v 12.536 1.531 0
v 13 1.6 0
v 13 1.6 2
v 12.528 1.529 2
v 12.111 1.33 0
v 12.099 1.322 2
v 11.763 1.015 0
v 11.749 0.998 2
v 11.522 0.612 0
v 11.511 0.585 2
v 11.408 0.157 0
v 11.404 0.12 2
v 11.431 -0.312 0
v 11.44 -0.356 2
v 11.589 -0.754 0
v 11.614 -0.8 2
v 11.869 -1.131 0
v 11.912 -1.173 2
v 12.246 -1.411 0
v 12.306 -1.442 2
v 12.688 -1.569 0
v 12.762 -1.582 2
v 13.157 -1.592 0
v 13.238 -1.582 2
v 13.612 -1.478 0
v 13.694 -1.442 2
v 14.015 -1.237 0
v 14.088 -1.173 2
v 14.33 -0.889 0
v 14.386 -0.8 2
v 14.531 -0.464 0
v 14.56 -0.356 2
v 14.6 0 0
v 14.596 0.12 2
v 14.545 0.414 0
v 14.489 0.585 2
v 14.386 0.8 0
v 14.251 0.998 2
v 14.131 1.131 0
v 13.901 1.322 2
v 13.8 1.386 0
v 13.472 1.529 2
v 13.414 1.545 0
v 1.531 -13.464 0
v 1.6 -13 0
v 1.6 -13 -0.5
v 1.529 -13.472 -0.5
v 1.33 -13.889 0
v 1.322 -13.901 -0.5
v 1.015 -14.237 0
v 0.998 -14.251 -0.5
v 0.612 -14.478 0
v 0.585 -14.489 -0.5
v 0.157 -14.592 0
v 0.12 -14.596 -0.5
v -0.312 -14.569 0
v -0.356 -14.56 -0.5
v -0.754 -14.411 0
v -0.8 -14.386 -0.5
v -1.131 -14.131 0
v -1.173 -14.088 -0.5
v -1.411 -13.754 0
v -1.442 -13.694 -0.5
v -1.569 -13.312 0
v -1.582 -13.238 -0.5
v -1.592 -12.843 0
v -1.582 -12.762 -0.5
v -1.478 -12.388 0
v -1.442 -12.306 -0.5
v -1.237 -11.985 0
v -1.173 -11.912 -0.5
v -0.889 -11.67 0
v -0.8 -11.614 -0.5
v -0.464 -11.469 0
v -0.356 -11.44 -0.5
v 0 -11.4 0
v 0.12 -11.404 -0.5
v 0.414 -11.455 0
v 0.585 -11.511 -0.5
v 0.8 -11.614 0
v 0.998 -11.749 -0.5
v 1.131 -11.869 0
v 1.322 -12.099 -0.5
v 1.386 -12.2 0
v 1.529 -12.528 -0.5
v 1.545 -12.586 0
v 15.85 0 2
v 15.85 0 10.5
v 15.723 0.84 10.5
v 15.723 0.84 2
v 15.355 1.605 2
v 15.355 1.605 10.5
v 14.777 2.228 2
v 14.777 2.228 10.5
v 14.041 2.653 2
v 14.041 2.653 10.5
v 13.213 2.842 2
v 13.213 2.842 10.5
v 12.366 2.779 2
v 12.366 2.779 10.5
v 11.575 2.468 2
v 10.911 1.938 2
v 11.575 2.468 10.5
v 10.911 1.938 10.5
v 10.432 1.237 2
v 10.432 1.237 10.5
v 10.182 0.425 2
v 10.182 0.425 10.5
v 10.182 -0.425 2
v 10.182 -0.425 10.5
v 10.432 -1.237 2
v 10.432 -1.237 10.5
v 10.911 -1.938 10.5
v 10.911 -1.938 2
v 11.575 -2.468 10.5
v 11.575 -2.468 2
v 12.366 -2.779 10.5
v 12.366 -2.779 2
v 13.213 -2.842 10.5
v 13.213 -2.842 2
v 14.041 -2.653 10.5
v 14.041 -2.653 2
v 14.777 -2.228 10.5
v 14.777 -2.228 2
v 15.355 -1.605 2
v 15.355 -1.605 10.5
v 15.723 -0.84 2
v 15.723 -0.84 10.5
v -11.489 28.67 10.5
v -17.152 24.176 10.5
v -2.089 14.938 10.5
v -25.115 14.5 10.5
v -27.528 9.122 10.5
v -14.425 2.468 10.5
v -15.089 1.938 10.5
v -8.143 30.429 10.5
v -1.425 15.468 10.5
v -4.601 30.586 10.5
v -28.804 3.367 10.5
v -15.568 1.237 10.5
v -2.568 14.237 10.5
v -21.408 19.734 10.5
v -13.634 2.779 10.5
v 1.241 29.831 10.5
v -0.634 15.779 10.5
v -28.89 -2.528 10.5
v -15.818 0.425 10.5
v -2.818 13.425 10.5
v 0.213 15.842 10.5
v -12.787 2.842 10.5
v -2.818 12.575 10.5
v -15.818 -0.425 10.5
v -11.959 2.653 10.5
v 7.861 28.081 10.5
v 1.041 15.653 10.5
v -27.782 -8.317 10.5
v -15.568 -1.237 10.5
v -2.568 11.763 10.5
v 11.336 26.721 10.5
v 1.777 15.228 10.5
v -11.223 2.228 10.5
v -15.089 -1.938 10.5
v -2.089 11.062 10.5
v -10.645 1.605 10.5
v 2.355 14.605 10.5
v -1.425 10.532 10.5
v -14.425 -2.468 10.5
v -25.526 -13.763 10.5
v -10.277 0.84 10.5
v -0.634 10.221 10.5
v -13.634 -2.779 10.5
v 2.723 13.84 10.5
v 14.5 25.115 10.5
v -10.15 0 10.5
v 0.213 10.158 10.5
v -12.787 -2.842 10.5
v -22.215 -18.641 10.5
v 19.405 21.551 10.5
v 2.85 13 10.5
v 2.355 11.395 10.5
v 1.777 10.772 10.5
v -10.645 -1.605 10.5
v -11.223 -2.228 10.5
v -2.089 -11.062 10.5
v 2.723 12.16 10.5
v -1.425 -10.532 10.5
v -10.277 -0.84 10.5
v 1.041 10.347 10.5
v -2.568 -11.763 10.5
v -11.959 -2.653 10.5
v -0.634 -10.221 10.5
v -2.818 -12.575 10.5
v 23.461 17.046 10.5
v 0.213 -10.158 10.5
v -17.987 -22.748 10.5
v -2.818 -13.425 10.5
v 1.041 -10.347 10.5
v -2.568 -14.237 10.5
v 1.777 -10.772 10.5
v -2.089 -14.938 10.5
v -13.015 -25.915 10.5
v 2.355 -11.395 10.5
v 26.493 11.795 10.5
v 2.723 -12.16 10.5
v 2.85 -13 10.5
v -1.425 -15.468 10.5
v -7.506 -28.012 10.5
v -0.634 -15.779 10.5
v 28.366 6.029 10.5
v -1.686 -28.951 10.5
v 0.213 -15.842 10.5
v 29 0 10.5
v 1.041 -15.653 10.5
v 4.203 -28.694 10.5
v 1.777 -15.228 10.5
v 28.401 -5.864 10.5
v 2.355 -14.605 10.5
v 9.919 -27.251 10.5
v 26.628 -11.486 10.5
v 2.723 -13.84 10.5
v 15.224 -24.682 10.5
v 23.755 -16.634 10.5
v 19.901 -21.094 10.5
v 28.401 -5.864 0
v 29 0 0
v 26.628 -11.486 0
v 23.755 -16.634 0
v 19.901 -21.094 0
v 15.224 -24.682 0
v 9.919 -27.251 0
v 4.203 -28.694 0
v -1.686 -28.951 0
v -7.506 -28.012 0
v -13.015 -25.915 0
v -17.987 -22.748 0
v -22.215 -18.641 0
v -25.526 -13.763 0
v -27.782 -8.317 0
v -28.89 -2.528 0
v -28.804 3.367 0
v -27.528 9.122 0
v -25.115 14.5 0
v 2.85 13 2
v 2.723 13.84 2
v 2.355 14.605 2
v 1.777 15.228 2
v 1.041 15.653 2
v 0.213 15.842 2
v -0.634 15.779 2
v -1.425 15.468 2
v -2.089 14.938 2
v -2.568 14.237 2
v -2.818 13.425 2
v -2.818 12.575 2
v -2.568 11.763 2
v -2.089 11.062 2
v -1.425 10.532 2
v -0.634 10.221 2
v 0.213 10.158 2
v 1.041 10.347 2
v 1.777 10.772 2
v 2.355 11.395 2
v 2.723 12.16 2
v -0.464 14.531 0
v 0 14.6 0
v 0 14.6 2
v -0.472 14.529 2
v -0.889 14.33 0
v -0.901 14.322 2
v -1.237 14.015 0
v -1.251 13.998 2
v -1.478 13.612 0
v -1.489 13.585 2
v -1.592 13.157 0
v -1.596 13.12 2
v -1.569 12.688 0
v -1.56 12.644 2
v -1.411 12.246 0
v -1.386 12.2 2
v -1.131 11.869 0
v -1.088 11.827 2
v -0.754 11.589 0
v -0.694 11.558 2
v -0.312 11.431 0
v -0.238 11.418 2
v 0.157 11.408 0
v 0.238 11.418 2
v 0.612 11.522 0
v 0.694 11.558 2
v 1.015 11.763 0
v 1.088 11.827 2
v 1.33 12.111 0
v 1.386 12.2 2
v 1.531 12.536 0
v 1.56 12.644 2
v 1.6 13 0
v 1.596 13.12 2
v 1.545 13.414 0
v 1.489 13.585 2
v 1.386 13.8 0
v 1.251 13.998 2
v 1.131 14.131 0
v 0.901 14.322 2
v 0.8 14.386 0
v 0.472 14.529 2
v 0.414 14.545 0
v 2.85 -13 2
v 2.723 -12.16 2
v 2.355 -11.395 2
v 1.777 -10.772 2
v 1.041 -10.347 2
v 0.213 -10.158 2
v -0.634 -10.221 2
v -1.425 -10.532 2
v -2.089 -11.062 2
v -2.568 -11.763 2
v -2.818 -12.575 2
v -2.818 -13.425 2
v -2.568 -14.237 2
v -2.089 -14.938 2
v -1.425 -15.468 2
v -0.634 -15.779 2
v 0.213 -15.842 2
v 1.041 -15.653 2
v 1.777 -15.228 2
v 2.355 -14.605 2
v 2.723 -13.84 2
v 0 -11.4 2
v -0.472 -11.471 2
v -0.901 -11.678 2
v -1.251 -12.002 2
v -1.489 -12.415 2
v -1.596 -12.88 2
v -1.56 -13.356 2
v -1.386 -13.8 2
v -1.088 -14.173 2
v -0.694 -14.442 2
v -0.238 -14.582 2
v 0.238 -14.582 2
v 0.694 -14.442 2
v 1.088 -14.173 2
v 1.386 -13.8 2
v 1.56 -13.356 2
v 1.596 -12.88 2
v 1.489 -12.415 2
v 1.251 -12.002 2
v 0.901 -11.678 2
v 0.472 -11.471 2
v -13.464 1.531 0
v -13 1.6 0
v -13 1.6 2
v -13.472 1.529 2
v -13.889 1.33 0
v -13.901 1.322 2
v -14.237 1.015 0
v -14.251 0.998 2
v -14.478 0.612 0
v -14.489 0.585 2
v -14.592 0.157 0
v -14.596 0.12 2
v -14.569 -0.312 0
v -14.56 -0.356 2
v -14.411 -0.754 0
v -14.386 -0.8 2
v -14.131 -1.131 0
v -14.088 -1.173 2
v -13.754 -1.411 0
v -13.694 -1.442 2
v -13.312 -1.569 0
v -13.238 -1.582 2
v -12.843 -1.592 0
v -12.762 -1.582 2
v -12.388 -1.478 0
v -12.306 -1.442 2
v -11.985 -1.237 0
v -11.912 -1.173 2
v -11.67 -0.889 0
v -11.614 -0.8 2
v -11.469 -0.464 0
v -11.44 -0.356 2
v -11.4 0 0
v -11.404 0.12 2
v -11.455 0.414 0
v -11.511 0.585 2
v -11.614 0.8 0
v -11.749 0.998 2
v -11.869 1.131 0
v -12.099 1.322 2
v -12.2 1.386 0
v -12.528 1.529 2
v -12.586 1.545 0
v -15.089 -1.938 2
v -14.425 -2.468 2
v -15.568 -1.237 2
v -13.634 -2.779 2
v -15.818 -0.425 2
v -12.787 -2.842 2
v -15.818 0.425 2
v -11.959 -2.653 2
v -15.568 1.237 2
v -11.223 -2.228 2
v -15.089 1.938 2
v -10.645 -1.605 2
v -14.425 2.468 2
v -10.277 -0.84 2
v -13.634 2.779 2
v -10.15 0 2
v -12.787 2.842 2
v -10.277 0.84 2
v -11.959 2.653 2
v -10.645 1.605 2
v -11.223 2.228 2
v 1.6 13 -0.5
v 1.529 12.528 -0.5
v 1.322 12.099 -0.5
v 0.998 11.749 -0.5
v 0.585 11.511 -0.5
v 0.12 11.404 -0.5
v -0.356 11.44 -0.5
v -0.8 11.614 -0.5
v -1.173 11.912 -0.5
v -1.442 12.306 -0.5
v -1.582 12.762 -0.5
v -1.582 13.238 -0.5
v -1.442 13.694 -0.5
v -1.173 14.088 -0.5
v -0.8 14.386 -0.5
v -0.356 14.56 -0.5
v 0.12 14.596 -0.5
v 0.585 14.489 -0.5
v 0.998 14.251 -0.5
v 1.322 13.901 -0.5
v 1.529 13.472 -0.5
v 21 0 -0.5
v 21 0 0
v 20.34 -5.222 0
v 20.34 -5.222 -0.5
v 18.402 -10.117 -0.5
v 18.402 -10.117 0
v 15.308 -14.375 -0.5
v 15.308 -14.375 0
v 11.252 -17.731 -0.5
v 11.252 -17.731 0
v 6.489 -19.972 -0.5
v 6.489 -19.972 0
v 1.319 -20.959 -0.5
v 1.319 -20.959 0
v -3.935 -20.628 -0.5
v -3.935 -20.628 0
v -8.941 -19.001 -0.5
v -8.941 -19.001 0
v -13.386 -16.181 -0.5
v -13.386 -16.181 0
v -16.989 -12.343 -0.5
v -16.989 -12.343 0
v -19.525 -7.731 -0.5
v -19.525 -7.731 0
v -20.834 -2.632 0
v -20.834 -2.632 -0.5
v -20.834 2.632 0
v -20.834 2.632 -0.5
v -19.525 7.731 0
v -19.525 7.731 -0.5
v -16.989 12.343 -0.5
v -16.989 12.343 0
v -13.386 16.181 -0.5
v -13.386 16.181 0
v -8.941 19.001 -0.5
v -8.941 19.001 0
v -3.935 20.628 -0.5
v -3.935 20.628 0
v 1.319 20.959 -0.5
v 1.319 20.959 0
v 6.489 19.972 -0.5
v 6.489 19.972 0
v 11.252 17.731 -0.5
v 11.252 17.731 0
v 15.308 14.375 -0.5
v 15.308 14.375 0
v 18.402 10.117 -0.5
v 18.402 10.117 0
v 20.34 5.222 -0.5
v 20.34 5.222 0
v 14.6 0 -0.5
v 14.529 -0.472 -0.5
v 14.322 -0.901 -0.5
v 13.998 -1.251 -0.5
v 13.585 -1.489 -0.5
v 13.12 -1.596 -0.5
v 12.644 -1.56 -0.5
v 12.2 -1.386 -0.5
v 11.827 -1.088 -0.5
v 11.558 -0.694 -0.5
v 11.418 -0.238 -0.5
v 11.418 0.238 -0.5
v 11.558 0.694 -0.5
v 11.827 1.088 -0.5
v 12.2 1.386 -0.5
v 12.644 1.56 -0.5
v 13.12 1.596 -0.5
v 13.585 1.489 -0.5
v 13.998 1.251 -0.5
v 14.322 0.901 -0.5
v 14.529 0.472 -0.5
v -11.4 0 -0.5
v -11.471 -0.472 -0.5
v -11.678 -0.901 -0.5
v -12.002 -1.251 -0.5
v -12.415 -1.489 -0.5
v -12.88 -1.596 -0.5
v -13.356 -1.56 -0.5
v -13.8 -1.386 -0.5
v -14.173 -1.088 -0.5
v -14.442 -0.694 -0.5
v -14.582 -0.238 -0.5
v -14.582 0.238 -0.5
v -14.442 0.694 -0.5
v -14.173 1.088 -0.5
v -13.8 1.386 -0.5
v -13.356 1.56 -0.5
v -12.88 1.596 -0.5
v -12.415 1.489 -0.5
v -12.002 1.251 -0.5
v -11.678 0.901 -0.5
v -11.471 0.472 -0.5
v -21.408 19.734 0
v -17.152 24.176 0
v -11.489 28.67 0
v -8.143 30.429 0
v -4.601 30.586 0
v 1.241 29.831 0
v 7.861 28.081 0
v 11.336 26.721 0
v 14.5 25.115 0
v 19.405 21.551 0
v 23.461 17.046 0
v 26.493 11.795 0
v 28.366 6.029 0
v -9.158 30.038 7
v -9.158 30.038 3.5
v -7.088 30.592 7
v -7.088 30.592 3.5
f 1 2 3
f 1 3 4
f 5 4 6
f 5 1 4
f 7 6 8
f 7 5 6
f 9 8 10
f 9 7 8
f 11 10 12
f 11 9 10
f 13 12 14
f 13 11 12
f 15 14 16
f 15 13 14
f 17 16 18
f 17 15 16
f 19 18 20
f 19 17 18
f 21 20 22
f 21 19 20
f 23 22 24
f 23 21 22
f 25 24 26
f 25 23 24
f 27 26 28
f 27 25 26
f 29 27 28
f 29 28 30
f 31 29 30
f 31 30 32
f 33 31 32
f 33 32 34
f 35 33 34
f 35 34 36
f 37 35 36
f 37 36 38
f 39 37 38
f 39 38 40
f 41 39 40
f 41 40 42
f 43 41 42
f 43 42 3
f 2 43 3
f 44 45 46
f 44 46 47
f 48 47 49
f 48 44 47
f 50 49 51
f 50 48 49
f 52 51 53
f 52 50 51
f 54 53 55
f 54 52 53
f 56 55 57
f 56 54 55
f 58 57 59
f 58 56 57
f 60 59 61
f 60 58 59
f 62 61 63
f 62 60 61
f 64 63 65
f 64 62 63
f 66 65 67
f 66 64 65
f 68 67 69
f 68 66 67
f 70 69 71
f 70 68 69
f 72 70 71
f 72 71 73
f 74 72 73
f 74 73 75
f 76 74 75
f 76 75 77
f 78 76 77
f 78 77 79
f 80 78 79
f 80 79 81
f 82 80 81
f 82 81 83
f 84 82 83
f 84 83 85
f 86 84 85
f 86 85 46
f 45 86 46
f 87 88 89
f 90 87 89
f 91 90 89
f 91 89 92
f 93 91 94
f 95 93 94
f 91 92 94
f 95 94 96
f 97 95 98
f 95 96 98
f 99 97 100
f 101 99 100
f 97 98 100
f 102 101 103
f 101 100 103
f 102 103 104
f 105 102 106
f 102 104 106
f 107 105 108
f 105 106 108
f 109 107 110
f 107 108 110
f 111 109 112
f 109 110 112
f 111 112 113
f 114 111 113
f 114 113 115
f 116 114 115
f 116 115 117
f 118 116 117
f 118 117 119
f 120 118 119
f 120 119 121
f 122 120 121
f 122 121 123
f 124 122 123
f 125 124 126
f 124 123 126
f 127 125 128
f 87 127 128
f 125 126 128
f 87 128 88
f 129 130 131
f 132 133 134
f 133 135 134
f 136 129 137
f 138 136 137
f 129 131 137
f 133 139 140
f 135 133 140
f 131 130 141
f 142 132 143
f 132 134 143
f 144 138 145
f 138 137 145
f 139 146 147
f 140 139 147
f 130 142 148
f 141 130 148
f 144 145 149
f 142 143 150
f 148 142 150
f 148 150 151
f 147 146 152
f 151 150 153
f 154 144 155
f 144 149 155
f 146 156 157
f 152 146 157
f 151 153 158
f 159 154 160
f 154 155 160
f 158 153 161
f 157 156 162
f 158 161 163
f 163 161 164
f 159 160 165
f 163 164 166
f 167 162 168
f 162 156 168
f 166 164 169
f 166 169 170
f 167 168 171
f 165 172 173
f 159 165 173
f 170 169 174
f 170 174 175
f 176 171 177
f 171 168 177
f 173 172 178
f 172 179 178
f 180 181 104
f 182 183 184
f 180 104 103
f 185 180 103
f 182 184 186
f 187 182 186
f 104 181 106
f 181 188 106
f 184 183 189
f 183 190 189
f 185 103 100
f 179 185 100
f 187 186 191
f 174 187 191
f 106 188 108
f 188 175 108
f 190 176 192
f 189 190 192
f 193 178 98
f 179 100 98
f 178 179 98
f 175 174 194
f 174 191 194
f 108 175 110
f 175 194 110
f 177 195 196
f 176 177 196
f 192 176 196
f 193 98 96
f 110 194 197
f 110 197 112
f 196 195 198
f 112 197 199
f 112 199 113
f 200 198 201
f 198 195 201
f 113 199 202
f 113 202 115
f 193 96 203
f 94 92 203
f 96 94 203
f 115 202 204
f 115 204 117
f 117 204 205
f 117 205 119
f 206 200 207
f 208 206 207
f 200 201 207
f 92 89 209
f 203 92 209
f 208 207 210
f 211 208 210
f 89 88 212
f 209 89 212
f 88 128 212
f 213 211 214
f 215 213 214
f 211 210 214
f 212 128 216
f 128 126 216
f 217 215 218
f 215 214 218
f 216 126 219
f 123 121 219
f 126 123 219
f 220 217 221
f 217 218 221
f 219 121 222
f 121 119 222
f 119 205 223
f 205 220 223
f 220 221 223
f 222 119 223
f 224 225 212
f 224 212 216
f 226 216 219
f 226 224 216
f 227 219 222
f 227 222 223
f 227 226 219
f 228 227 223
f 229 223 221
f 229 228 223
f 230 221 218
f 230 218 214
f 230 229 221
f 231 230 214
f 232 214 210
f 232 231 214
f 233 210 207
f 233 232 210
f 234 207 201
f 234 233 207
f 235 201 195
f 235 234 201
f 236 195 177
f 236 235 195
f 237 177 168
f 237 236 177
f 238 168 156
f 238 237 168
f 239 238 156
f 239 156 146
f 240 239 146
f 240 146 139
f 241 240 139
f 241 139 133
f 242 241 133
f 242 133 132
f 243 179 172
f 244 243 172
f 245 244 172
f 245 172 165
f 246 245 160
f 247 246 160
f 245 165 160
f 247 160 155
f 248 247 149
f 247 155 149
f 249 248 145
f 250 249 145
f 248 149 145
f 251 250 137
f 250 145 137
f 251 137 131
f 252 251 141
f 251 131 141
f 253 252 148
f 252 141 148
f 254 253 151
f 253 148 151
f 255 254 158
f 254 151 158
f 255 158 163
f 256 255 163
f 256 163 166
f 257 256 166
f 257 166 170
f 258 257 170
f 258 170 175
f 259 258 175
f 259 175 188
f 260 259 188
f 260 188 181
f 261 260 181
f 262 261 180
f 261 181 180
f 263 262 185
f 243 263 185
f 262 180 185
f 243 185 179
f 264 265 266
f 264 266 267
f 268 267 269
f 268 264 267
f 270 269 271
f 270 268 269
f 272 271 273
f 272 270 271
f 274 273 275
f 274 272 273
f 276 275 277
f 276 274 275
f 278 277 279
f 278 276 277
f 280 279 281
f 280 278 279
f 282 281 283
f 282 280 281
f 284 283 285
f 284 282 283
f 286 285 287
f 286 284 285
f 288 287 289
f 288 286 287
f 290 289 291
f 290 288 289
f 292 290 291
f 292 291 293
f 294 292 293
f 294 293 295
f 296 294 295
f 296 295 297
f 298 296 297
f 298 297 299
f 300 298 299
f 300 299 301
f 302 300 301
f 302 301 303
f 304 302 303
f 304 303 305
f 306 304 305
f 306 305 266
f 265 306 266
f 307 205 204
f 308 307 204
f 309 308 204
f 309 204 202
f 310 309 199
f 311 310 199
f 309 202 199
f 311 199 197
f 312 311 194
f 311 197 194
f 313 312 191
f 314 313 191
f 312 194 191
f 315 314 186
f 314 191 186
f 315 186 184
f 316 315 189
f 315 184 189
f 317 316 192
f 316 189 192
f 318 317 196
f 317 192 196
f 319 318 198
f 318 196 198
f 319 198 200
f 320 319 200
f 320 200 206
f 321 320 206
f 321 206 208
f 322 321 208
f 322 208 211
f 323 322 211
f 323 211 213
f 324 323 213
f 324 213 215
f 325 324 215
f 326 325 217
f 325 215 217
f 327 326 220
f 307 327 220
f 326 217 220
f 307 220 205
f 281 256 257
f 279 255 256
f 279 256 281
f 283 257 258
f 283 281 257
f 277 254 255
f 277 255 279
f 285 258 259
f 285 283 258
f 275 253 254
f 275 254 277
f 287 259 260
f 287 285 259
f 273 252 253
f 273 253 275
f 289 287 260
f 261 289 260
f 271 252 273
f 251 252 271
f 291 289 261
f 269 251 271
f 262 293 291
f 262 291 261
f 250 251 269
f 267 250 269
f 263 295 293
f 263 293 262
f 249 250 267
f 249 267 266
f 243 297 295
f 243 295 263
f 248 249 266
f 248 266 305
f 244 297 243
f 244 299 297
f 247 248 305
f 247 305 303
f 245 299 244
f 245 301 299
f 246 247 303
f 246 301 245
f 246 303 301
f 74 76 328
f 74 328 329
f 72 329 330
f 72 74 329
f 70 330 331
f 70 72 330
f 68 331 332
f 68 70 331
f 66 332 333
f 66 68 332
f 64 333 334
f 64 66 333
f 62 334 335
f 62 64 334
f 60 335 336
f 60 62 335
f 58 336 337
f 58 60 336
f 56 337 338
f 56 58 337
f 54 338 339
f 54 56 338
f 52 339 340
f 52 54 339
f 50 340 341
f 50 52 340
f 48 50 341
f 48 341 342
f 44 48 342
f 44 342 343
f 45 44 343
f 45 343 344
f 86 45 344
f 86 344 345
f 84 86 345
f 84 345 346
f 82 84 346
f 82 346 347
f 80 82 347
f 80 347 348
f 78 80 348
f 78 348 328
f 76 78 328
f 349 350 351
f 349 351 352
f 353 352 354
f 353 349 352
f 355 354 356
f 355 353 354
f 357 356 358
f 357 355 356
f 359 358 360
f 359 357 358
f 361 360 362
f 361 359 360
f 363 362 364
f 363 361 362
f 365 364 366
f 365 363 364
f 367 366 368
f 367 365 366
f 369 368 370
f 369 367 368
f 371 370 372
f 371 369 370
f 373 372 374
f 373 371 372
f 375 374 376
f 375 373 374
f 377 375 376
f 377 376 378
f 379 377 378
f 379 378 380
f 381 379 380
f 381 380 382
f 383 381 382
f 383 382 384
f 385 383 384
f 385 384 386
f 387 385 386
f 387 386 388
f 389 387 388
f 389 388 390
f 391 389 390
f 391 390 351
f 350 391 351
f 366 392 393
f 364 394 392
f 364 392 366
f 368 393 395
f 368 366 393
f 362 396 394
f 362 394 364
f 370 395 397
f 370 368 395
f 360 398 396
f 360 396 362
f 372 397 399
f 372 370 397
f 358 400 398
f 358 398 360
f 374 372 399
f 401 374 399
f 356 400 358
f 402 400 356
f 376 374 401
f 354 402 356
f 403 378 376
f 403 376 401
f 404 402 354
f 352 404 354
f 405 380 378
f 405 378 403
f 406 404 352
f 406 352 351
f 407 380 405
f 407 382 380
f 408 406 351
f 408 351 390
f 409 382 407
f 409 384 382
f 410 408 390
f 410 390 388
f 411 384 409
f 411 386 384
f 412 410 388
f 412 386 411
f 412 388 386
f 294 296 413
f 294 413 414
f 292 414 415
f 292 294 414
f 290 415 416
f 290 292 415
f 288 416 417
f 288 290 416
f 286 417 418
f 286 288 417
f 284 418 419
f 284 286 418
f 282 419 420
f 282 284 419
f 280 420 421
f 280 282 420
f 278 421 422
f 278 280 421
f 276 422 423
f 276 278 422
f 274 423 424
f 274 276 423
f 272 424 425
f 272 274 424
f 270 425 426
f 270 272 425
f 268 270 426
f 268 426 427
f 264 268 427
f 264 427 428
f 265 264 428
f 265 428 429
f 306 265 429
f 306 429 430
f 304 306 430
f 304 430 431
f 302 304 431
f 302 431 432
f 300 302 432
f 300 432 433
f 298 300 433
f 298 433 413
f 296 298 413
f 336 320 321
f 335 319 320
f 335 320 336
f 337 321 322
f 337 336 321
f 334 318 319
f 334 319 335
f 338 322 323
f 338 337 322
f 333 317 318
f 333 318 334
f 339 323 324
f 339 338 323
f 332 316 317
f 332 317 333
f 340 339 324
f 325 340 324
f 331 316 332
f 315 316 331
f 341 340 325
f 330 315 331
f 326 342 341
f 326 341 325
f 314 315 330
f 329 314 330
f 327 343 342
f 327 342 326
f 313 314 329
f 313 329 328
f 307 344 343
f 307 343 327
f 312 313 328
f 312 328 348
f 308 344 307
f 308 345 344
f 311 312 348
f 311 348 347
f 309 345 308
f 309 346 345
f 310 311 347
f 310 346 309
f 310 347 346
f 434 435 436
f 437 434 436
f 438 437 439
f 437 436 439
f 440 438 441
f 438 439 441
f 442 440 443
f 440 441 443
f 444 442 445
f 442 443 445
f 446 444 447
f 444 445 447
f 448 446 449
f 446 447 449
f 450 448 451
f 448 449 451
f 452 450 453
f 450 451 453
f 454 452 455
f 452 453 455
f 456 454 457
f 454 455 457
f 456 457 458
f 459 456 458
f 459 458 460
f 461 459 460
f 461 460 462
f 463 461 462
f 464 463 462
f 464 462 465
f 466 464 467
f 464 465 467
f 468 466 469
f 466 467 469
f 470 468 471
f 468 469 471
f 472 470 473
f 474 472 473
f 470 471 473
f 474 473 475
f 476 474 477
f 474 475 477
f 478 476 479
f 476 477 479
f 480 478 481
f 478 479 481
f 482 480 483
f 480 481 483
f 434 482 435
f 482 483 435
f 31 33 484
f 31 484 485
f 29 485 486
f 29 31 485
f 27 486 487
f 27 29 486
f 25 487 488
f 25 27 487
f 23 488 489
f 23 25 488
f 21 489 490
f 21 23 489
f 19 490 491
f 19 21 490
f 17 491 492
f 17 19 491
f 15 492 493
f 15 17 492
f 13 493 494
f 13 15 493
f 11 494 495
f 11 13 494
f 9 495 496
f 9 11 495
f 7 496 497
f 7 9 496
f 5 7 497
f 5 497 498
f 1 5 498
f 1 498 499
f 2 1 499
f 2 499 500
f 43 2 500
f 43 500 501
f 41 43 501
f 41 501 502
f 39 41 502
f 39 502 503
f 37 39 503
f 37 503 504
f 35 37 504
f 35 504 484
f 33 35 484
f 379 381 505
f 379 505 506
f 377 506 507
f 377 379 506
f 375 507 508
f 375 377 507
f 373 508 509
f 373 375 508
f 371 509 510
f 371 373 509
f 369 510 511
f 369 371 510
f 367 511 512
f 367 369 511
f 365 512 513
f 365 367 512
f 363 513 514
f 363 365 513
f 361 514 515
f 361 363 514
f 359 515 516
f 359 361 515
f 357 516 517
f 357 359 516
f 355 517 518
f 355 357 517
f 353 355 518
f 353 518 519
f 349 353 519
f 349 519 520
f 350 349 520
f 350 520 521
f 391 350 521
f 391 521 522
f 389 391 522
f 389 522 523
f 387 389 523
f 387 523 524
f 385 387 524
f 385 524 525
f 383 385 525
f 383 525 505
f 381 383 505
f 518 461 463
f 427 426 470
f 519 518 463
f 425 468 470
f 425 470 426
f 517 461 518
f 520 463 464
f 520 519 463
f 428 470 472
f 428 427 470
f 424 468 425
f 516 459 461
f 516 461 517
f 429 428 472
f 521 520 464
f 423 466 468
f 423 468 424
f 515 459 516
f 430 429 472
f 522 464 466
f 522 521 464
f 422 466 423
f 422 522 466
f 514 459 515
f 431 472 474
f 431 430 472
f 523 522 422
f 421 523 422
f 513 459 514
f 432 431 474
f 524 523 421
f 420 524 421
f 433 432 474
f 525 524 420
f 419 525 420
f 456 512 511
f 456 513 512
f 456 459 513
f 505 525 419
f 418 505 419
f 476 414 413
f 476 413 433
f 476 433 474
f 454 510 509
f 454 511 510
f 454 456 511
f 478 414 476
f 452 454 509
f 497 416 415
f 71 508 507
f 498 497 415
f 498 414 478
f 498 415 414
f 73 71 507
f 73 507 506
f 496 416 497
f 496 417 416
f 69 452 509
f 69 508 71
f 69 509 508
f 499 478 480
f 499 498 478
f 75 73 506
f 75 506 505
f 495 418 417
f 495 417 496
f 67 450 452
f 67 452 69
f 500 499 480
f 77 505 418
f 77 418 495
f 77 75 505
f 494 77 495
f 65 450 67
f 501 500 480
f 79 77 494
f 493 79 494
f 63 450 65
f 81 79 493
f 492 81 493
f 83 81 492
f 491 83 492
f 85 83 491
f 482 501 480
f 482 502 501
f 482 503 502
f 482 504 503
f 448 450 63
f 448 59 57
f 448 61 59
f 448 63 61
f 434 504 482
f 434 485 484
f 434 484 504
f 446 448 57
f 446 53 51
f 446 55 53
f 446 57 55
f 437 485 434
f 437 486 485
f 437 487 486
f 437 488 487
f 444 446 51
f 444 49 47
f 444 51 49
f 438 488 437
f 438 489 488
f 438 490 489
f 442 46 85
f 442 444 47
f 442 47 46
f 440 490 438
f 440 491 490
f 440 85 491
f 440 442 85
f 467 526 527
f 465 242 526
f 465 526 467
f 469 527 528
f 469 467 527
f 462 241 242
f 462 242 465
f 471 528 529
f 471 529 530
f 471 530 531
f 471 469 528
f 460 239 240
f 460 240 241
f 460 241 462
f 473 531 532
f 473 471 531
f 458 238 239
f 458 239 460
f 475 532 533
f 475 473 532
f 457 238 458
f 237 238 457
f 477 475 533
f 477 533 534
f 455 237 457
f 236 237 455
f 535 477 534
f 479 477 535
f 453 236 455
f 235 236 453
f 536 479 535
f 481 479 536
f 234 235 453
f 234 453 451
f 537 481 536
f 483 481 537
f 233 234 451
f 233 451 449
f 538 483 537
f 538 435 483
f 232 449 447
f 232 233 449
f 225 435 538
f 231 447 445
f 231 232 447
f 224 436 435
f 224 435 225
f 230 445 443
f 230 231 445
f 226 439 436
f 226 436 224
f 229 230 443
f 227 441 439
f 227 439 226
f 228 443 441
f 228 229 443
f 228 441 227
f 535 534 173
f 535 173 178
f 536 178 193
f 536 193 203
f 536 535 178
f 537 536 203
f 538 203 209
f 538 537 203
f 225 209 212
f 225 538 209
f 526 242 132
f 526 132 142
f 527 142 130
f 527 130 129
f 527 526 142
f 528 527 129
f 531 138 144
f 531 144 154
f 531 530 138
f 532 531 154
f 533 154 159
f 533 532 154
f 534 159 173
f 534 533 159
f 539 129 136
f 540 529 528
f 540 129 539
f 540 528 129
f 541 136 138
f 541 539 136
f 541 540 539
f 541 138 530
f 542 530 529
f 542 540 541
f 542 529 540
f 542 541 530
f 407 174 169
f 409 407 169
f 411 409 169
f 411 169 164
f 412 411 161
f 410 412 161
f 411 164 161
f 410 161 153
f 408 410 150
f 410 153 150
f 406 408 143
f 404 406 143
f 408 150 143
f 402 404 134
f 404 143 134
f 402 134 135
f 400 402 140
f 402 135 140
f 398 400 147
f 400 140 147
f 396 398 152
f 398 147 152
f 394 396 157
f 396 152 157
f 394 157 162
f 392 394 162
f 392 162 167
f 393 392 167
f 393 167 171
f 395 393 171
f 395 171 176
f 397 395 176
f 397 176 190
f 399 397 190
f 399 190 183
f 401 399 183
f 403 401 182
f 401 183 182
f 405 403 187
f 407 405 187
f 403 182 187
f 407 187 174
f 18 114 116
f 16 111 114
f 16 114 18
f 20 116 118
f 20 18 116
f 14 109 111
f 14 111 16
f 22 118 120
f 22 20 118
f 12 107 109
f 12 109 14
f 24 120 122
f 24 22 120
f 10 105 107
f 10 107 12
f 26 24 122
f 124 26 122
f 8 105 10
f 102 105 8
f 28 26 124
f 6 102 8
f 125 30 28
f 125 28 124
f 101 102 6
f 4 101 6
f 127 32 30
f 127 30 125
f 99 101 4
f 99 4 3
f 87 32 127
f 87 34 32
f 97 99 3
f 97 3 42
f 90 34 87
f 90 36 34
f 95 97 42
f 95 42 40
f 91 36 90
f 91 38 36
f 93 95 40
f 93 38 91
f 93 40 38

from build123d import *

# Parameters (mm, degrees)
SKETCH1_R               = 21
SKETCH1_R_2             = 2.85
SKETCH1_R_3             = 1.6
BOSS_EXTRUDE1_DEPTH     = 10.5
SKETCH2_R               = 21
BOSS_EXTRUDE3_DEPTH     = 10.5
SKETCH3_R               = 21
SKETCH3_R_2             = 1.6
BOSS_EXTRUDE4_DEPTH     = 0.5
SKETCH4_R               = 2.85
SKETCH4_R_2             = 1.6
CUT_EXTRUDE1_DEPTH      = 1.0000001
CUT_EXTRUDE1_DEPTH_BACK = 8.5


with BuildPart() as part:
    # Sketch1 → Boss-Extrude1 (new body)
    with BuildSketch(Plane(origin=(0, 0, 0), x_dir=(0, 1, 0), z_dir=(0, 0, 1))):
        Circle(SKETCH1_R)
        with Locations((-13, 0)):
            Circle(SKETCH1_R_2, mode=Mode.SUBTRACT)
        with Locations((0, -13)):
            Circle(SKETCH1_R_2, mode=Mode.SUBTRACT)
        with Locations((13, 0)):
            Circle(SKETCH1_R_2, mode=Mode.SUBTRACT)
        with Locations((0, 13)):
            Circle(SKETCH1_R_2, mode=Mode.SUBTRACT)
        with Locations((-13, 0)):
            Circle(SKETCH1_R_2)
        with Locations((-13, 0)):
            Circle(SKETCH1_R_3, mode=Mode.SUBTRACT)
        with Locations((0, 13)):
            Circle(SKETCH1_R_2)
        with Locations((0, 13)):
            Circle(SKETCH1_R_3, mode=Mode.SUBTRACT)
        with Locations((13, 0)):
            Circle(SKETCH1_R_2)
        with Locations((13, 0)):
            Circle(SKETCH1_R_3, mode=Mode.SUBTRACT)
        with Locations((0, -13)):
            Circle(SKETCH1_R_2)
        with Locations((0, -13)):
            Circle(SKETCH1_R_3, mode=Mode.SUBTRACT)
    extrude(amount=BOSS_EXTRUDE1_DEPTH)

    # Sketch2 → Boss-Extrude3 (add)
    with BuildSketch(Plane(origin=(0, 0, 0), x_dir=(1, 0, 0), z_dir=(0, 0, -1))):
        with BuildLine():
            ThreePointArc((14.5, -25.11473671), (25.11473671, -14.5), (29, 0))
            ThreePointArc((29, 0), (-7.505752308, 28.011848962), (-25.11473671, -14.5))
            add(Edge.make_bspline(
                [(-25.11473671, -14.5), (-20.61473671, -22.294228634), (-10.692661327, -29.786053624), (-5.632910469, -31.14180978), (6.705771366, -29.61473671), (14.5, -25.11473671)],
                knots=[0, 0, 0, 0, 0.45, 0.55, 1, 1, 1, 1], degree=3))
        make_face()
        Circle(SKETCH2_R, mode=Mode.SUBTRACT)
    extrude(amount=-BOSS_EXTRUDE3_DEPTH)

    # Sketch3 → Boss-Extrude4 (add)
    with BuildSketch(Plane(origin=(0, 0, 0), x_dir=(1, 0, 0), z_dir=(0, 0, -1))):
        Circle(SKETCH3_R)
        with Locations((-13, 0)):
            Circle(SKETCH3_R_2, mode=Mode.SUBTRACT)
        with Locations((0, 13)):
            Circle(SKETCH3_R_2, mode=Mode.SUBTRACT)
        with Locations((13, 0)):
            Circle(SKETCH3_R_2, mode=Mode.SUBTRACT)
        with Locations((0, -13)):
            Circle(SKETCH3_R_2, mode=Mode.SUBTRACT)
    extrude(amount=BOSS_EXTRUDE4_DEPTH)

    # Sketch4 → Cut-Extrude1 (cut, two sides)
    with BuildSketch(Plane.XY.offset(10.5)) as cut_extrude1_sk:
        with Locations((0, 13)):
            Circle(SKETCH4_R)
        with Locations((0, 13)):
            Circle(SKETCH4_R_2, mode=Mode.SUBTRACT)
        with Locations((13, 0)):
            Circle(SKETCH4_R)
        with Locations((13, 0)):
            Circle(SKETCH4_R_2, mode=Mode.SUBTRACT)
        with Locations((0, -13)):
            Circle(SKETCH4_R)
        with Locations((0, -13)):
            Circle(SKETCH4_R_2, mode=Mode.SUBTRACT)
        with Locations((-13, 0)):
            Circle(SKETCH4_R)
        with Locations((-13, 0)):
            Circle(SKETCH4_R_2, mode=Mode.SUBTRACT)
    extrude(amount=CUT_EXTRUDE1_DEPTH, mode=Mode.SUBTRACT)
    extrude(cut_extrude1_sk.sketch, amount=-CUT_EXTRUDE1_DEPTH_BACK, mode=Mode.SUBTRACT)


solid = part.part
